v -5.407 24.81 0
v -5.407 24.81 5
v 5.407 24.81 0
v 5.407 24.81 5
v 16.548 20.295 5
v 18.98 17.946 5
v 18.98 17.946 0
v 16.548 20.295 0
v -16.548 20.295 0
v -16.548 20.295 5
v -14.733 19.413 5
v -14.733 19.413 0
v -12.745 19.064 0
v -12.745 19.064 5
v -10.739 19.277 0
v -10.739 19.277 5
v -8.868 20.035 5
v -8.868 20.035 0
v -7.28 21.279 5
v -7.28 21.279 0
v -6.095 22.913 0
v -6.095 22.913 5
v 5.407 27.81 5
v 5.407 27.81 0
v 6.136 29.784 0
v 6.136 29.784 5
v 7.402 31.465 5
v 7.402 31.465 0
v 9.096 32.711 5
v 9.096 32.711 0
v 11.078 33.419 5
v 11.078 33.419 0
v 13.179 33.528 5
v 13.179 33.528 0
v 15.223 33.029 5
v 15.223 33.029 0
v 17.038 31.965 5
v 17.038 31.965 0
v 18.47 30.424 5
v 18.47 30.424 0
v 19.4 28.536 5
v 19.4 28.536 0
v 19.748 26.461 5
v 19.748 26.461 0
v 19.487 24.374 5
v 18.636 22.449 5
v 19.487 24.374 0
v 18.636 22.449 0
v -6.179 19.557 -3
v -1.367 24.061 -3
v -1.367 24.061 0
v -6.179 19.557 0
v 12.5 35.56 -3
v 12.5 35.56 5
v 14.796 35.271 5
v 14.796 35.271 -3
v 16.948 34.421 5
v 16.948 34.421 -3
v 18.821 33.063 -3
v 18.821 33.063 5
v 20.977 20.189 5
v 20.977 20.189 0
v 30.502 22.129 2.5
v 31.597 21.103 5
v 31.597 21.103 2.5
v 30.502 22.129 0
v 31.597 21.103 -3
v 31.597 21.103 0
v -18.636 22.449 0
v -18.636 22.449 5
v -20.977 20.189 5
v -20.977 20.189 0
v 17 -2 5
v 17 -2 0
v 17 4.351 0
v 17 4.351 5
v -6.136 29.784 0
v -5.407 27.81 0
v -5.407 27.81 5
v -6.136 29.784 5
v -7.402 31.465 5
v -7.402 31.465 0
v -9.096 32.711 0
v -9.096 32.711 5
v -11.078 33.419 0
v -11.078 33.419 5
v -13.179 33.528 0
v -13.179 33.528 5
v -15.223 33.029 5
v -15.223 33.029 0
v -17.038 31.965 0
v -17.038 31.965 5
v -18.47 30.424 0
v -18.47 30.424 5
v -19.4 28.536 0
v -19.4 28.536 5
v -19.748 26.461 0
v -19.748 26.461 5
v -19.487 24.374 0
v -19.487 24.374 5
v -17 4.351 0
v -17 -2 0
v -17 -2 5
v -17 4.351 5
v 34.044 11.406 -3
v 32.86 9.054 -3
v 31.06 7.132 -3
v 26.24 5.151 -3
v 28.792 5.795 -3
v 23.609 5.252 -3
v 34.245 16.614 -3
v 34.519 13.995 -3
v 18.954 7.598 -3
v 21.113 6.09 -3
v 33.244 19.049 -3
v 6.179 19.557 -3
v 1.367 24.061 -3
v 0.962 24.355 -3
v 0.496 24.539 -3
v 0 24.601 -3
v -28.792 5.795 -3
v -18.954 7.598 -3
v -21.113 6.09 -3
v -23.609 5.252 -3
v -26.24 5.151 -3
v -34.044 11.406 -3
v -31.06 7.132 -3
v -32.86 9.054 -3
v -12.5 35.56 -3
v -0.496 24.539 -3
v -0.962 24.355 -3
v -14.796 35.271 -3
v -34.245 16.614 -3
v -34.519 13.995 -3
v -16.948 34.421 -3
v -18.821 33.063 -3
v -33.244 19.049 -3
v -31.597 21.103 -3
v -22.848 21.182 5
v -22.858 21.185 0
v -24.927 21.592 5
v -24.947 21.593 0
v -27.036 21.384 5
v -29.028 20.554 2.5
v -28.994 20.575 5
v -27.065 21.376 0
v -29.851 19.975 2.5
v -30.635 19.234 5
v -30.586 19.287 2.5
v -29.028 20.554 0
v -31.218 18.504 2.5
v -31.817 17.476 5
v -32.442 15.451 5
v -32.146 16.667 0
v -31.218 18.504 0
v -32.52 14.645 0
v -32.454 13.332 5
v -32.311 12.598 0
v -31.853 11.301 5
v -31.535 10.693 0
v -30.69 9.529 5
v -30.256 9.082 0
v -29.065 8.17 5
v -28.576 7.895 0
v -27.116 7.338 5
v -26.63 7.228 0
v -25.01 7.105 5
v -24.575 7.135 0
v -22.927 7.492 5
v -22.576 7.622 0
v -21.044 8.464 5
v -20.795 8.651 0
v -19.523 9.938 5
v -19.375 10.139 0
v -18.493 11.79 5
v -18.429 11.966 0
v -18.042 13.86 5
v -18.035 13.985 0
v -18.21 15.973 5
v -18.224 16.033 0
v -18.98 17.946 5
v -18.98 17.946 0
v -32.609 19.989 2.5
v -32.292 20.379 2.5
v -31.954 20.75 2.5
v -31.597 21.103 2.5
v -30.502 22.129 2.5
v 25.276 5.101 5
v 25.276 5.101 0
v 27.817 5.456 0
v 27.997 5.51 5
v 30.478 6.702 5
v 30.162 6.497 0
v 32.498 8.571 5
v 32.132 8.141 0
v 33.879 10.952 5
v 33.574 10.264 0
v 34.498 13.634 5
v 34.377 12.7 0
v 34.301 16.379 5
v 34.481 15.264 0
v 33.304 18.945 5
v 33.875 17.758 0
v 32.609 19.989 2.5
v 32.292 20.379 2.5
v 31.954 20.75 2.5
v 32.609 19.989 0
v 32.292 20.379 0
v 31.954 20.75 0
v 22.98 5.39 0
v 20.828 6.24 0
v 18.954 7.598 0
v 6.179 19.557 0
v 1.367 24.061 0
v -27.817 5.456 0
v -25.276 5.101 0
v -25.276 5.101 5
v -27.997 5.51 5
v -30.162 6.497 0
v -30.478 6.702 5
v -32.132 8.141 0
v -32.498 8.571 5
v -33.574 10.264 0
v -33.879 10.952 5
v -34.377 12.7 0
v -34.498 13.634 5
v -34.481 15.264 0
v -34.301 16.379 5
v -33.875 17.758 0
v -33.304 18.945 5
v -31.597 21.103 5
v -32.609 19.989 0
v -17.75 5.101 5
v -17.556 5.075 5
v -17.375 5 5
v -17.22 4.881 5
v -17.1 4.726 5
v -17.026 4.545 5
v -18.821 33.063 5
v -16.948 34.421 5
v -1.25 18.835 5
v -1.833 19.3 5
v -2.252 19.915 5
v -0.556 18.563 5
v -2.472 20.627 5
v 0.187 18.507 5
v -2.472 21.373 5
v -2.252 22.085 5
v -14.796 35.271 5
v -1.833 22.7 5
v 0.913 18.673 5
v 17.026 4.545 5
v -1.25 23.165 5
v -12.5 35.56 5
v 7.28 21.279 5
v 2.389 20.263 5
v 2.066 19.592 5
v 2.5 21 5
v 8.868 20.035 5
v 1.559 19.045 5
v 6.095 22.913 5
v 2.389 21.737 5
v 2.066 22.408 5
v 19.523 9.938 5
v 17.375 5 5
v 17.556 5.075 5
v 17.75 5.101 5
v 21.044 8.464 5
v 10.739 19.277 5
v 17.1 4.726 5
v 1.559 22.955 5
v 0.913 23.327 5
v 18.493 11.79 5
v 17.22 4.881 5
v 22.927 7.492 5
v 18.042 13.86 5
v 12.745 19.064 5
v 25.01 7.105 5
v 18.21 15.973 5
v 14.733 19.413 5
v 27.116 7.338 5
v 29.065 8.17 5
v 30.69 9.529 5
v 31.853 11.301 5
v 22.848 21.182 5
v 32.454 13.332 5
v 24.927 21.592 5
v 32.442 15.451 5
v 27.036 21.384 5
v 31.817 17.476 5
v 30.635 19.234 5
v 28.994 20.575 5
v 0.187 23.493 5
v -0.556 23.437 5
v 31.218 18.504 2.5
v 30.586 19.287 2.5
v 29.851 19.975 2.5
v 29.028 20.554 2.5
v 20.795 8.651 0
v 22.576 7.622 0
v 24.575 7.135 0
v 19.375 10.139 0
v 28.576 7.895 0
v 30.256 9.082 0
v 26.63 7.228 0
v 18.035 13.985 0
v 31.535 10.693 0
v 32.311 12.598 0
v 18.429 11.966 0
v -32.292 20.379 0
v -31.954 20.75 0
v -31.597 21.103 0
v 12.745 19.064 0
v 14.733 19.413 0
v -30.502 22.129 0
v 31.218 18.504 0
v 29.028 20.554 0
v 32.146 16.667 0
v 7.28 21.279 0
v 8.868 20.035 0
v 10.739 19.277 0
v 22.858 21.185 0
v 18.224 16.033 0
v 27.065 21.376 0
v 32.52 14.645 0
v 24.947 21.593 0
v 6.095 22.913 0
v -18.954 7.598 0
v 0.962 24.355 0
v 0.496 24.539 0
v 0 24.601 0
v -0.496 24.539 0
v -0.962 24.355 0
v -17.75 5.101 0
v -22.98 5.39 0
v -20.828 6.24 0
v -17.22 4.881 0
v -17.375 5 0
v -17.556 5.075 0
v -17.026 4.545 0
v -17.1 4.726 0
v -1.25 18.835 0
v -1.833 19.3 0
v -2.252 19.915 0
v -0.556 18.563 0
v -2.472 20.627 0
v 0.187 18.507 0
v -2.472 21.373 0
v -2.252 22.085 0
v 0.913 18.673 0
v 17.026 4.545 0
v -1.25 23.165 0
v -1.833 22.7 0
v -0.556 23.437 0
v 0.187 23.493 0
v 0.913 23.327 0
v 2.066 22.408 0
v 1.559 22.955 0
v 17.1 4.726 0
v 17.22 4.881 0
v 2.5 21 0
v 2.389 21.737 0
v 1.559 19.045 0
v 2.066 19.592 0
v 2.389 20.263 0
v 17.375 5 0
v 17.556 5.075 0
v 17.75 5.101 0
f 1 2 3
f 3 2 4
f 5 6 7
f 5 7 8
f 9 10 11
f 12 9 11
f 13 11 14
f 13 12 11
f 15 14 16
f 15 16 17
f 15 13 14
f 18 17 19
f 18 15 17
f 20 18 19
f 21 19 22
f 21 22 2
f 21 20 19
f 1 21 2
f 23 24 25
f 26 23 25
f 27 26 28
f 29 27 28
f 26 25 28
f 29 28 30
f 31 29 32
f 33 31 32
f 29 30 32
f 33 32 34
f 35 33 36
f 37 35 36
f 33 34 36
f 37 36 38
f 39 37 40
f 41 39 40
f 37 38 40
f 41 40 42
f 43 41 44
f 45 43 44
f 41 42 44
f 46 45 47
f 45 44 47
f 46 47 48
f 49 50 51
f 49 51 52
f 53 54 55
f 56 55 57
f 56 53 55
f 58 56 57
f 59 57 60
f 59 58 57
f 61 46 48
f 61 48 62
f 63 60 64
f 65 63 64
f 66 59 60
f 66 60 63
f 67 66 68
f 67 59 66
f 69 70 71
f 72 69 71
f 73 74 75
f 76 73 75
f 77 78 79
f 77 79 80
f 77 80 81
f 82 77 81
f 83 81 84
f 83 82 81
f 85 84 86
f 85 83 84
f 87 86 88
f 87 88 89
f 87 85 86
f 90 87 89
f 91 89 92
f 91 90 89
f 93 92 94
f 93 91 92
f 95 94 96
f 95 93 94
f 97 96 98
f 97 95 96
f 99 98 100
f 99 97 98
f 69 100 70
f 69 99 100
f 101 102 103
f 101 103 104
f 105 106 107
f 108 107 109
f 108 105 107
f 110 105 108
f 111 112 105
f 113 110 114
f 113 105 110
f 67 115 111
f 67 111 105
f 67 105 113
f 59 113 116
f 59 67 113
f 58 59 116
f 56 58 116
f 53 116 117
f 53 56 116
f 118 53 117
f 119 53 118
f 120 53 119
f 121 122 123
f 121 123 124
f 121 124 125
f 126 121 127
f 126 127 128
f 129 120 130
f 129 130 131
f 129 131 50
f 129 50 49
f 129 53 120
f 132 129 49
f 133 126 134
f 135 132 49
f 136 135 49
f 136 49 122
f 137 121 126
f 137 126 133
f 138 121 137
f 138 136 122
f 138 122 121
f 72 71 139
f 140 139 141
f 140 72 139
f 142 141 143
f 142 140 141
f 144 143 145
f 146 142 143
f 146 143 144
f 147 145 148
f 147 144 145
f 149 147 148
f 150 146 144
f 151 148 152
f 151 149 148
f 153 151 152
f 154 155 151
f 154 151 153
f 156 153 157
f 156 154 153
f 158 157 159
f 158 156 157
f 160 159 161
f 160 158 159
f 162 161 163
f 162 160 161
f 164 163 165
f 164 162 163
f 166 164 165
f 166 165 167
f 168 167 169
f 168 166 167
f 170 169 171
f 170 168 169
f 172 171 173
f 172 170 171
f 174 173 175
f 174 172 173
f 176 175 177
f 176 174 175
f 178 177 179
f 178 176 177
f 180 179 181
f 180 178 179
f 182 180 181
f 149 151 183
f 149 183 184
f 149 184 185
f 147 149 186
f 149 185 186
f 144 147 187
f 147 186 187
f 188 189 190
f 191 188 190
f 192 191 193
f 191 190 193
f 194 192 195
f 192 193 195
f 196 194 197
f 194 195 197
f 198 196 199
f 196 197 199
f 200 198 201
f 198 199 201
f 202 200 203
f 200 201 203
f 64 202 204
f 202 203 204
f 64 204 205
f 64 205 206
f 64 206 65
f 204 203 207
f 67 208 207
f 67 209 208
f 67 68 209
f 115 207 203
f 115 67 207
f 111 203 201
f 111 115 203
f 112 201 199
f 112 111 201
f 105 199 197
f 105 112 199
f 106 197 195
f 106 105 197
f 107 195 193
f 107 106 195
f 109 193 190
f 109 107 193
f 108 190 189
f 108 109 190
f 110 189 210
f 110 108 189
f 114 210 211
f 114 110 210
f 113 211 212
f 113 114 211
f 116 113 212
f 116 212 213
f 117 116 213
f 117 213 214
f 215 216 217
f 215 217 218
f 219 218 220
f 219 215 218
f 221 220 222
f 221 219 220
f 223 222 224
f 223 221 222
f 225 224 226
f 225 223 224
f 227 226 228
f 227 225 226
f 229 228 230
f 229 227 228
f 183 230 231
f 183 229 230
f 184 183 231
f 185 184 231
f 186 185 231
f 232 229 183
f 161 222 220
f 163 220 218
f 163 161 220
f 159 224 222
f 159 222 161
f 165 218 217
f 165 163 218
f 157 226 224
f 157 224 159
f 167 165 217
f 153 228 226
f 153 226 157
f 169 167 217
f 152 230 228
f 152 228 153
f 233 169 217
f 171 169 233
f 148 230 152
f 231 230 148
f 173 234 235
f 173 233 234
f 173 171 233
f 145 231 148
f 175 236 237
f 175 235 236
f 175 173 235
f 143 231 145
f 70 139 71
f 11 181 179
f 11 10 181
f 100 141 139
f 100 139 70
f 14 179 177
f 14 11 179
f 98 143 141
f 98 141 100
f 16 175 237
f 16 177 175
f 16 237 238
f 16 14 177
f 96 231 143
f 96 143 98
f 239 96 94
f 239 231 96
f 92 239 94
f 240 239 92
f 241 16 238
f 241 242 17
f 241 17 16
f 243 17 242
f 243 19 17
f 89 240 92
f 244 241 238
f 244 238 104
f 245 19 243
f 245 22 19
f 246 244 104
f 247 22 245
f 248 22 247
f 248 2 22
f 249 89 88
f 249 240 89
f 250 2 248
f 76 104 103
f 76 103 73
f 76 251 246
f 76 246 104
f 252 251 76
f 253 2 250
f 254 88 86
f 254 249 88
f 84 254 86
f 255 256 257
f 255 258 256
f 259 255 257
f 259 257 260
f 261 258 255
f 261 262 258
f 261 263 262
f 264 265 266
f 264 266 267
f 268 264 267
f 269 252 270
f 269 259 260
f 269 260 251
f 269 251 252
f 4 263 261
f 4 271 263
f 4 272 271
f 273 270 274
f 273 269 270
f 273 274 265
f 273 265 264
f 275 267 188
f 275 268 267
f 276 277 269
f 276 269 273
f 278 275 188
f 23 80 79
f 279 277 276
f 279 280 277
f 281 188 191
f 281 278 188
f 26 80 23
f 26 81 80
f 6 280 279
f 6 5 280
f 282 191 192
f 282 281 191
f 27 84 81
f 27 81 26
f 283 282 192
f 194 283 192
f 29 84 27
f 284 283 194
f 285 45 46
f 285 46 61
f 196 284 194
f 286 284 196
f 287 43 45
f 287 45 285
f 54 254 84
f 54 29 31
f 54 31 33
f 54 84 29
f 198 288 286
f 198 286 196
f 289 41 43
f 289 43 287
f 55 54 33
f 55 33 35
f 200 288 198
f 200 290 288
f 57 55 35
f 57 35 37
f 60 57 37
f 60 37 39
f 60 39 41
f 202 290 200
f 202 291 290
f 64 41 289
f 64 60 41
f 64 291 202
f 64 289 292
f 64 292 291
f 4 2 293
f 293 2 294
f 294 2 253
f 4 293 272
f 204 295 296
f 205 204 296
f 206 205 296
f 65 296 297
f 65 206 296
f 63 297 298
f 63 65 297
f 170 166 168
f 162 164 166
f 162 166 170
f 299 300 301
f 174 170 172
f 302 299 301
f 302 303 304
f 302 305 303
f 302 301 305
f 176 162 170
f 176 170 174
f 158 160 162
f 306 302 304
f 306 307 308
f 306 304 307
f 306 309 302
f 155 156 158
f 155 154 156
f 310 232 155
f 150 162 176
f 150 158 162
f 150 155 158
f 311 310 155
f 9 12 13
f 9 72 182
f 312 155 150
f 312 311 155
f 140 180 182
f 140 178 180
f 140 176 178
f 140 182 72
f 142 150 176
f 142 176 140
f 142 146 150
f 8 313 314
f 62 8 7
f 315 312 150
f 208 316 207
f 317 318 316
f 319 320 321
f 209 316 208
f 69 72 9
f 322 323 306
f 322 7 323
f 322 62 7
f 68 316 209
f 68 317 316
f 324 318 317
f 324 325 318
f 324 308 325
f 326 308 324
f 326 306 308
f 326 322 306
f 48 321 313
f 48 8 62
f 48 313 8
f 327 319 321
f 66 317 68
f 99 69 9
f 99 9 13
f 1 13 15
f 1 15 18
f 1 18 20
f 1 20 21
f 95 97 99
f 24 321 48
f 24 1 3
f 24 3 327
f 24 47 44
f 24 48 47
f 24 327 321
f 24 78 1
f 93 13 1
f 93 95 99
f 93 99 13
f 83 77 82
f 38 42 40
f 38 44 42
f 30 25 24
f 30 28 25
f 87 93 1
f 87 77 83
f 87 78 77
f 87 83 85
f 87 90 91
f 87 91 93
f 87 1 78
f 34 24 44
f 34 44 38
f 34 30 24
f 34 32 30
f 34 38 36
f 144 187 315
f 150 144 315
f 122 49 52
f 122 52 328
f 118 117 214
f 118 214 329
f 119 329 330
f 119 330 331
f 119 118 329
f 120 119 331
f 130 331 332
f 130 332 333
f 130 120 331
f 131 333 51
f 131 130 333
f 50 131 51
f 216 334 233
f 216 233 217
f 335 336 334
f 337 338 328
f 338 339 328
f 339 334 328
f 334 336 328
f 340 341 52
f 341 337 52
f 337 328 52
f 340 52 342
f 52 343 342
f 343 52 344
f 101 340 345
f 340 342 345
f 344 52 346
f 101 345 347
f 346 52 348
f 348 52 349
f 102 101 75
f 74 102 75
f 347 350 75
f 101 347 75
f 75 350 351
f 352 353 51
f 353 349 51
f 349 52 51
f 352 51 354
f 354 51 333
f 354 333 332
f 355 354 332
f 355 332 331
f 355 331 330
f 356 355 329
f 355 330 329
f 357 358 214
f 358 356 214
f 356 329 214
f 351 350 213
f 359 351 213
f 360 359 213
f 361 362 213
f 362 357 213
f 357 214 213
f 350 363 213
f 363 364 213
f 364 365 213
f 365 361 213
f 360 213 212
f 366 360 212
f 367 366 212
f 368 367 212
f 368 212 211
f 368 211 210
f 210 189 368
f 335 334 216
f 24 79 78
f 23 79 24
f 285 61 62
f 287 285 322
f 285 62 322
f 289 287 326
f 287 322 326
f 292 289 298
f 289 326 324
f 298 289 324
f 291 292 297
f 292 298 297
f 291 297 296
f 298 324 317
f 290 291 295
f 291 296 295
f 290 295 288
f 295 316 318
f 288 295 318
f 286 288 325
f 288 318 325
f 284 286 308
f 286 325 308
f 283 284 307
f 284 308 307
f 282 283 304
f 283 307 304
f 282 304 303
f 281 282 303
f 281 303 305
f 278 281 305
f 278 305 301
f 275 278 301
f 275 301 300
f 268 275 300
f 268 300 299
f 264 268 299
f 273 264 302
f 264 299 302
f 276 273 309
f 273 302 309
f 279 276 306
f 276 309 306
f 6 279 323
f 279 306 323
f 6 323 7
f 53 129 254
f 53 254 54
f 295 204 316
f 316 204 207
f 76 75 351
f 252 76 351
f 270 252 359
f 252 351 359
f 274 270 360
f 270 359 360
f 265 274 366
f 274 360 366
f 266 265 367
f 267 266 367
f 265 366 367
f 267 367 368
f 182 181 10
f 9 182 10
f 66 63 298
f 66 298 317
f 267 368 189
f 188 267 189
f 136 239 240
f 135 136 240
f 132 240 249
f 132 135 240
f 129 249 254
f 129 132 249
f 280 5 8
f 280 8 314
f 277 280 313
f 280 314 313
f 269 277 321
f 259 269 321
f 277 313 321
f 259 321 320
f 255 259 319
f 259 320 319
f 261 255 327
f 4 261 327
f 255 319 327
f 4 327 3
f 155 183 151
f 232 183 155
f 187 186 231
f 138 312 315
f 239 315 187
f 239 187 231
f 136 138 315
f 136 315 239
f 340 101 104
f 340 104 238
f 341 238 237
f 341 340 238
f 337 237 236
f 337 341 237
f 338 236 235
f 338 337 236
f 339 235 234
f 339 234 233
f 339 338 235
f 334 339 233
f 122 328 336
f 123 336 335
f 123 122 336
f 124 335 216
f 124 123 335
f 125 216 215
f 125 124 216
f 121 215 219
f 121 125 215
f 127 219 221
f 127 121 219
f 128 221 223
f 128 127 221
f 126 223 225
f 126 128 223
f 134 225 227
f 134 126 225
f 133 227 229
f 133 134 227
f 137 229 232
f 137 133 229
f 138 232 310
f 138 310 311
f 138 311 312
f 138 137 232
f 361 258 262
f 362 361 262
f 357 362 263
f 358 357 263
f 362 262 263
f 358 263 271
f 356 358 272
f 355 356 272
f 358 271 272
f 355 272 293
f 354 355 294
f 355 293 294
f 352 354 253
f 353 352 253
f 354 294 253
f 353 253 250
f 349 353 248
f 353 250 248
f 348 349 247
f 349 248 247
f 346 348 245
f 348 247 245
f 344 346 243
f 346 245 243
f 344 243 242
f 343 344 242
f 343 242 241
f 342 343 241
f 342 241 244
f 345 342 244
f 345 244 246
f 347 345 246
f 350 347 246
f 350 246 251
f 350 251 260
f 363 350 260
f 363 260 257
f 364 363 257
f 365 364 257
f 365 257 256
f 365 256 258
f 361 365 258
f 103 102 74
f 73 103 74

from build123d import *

# Parameters (mm, degrees)
SKETCH1_R           = 7.25
BOSS_EXTRUDE1_DEPTH = 5
BOSS_EXTRUDE2_START = 3
BOSS_EXTRUDE2_DEPTH = 3
SKETCH5_W           = 15.42907023
SKETCH5_H           = 3
CUT_EXTRUDE2_DEPTH  = 5
SKETCH7_W           = 3
SKETCH7_H           = 2.5
CUT_EXTRUDE4_DEPTH  = 10
SKETCH8_R           = 2.5
CUT_EXTRUDE5_DEPTH  = 10


with BuildPart() as part:
    # Sketch1 → Boss-Extrude1 (new body)
    with BuildSketch(Plane.XY):
        with BuildLine():
            ThreePointArc((-25.275752705, 5.100552072), (-33.878856947, 10.952155773), (-31.597213811, 21.10344993))
            Line((-31.597213811, 21.10344993), (-18.821461106, 33.062970941))
            ThreePointArc((-18.821461106, 33.062970941), (-15.898396299, 34.913177324), (-12.5, 35.560073083))
            Line((-12.5, 35.560073083), (0, 35.560073083))
            Line((0, 35.560073083), (0, -2))
            Line((0, -2), (-17, -2))
            Line((-17, -2), (-17, 4.350552072))
            ThreePointArc((-17, 4.350552072), (-17.219669914, 4.880882158), (-17.75, 5.100552072))
            Line((-17.75, 5.100552072), (-25.275752705, 5.100552072))
        make_face()
        with Locations((-12.5, 26.310073083)):
            Circle(SKETCH1_R, mode=Mode.SUBTRACT)
        with Locations((-25.275752705, 14.350552072)):
            Circle(SKETCH1_R, mode=Mode.SUBTRACT)
    boss_extrude1 = extrude(amount=BOSS_EXTRUDE1_DEPTH)

    # Mirror1: Boss-Extrude1 across plane
    add(boss_extrude1.mirror(Plane(origin=(0, 0, 0), x_dir=(0, 0, 1), z_dir=(1, 0, 0))))

    # Sketch3 → Boss-Extrude2 (add)
    with BuildSketch(Plane(origin=(0, 0, 0), x_dir=(-1, 0, 0), z_dir=(0, 0, -1)).offset(BOSS_EXTRUDE2_START)):
        with BuildLine():
            Line((31.597213811, 21.10344993), (18.821461106, 33.062970941))
            ThreePointArc((18.821461106, 33.062970941), (15.898396299, 34.913177324), (12.5, 35.560073083))
            Line((12.5, 35.560073083), (-12.5, 35.560073083))
            ThreePointArc((-12.5, 35.560073083), (-15.898396299, 34.913177324), (-18.821461106, 33.062970941))
            Line((-18.821461106, 33.062970941), (-31.597213811, 21.10344993))
            ThreePointArc((-31.597213811, 21.10344993), (-32.028650564, 8.029090966), (-18.954291599, 7.597654213))
            Line((-18.954291599, 7.597654213), (-6.178538894, 19.557175224))
            Line((-6.178538894, 19.557175224), (-1.366802401, 24.061494071))
            ThreePointArc((-1.366802401, 24.061494071), (0, 24.601408047), (1.366802401, 24.061494071))
            Line((1.366802401, 24.061494071), (6.178538894, 19.557175224))
            Line((6.178538894, 19.557175224), (18.954291599, 7.597654213))
            ThreePointArc((18.954291599, 7.597654213), (32.028650564, 8.029090966), (31.597213811, 21.10344993))
        make_face()
    extrude(amount=-BOSS_EXTRUDE2_DEPTH)

    # Sketch5 → Cut-Extrude2 (cut)
    with BuildSketch(Plane.XY.offset(5)):
        Polygon((-12.873838012, 28.014542797), (-28.664096552, 12.764122156), (-26.57998389, 10.606235594), (-10.78972535, 25.856656236), align=None)
        with Locations((0.808061856, 26.310073083)):
            Rectangle(SKETCH5_W, SKETCH5_H)
        Polygon((26.57998389, 10.606235594), (10.78972535, 25.856656236), (12.873838012, 28.014542797), (28.664096552, 12.764122156), align=None)
    extrude(amount=-CUT_EXTRUDE2_DEPTH, mode=Mode.SUBTRACT)

    # Sketch7 → Cut-Extrude4 (cut)
    with BuildSketch(Plane(origin=(-25.285844423, 27.011591434, 0), x_dir=(0.7300430117299187, 0.6834012006313055, 0), z_dir=(-0.6834012006313055, 0.7300430117299187, 0))):
        with Locations((-8.645202113, -1.25)):
            Rectangle(SKETCH7_W, SKETCH7_H)
    cut_extrude4 = extrude(amount=-CUT_EXTRUDE4_DEPTH, mode=Mode.SUBTRACT)

    # Mirror3: Cut-Extrude4 across plane
    add(cut_extrude4.mirror(Plane(origin=(0, 0, 0), x_dir=(0, 0, 1), z_dir=(1, 0, 0))), mode=Mode.SUBTRACT)

    # Sketch8 → Cut-Extrude5 (cut)
    with BuildSketch(Plane.XY.offset(5)):
        with Locations((0, 21)):
            Circle(SKETCH8_R)
    extrude(amount=-CUT_EXTRUDE5_DEPTH, mode=Mode.SUBTRACT)


solid = part.part
